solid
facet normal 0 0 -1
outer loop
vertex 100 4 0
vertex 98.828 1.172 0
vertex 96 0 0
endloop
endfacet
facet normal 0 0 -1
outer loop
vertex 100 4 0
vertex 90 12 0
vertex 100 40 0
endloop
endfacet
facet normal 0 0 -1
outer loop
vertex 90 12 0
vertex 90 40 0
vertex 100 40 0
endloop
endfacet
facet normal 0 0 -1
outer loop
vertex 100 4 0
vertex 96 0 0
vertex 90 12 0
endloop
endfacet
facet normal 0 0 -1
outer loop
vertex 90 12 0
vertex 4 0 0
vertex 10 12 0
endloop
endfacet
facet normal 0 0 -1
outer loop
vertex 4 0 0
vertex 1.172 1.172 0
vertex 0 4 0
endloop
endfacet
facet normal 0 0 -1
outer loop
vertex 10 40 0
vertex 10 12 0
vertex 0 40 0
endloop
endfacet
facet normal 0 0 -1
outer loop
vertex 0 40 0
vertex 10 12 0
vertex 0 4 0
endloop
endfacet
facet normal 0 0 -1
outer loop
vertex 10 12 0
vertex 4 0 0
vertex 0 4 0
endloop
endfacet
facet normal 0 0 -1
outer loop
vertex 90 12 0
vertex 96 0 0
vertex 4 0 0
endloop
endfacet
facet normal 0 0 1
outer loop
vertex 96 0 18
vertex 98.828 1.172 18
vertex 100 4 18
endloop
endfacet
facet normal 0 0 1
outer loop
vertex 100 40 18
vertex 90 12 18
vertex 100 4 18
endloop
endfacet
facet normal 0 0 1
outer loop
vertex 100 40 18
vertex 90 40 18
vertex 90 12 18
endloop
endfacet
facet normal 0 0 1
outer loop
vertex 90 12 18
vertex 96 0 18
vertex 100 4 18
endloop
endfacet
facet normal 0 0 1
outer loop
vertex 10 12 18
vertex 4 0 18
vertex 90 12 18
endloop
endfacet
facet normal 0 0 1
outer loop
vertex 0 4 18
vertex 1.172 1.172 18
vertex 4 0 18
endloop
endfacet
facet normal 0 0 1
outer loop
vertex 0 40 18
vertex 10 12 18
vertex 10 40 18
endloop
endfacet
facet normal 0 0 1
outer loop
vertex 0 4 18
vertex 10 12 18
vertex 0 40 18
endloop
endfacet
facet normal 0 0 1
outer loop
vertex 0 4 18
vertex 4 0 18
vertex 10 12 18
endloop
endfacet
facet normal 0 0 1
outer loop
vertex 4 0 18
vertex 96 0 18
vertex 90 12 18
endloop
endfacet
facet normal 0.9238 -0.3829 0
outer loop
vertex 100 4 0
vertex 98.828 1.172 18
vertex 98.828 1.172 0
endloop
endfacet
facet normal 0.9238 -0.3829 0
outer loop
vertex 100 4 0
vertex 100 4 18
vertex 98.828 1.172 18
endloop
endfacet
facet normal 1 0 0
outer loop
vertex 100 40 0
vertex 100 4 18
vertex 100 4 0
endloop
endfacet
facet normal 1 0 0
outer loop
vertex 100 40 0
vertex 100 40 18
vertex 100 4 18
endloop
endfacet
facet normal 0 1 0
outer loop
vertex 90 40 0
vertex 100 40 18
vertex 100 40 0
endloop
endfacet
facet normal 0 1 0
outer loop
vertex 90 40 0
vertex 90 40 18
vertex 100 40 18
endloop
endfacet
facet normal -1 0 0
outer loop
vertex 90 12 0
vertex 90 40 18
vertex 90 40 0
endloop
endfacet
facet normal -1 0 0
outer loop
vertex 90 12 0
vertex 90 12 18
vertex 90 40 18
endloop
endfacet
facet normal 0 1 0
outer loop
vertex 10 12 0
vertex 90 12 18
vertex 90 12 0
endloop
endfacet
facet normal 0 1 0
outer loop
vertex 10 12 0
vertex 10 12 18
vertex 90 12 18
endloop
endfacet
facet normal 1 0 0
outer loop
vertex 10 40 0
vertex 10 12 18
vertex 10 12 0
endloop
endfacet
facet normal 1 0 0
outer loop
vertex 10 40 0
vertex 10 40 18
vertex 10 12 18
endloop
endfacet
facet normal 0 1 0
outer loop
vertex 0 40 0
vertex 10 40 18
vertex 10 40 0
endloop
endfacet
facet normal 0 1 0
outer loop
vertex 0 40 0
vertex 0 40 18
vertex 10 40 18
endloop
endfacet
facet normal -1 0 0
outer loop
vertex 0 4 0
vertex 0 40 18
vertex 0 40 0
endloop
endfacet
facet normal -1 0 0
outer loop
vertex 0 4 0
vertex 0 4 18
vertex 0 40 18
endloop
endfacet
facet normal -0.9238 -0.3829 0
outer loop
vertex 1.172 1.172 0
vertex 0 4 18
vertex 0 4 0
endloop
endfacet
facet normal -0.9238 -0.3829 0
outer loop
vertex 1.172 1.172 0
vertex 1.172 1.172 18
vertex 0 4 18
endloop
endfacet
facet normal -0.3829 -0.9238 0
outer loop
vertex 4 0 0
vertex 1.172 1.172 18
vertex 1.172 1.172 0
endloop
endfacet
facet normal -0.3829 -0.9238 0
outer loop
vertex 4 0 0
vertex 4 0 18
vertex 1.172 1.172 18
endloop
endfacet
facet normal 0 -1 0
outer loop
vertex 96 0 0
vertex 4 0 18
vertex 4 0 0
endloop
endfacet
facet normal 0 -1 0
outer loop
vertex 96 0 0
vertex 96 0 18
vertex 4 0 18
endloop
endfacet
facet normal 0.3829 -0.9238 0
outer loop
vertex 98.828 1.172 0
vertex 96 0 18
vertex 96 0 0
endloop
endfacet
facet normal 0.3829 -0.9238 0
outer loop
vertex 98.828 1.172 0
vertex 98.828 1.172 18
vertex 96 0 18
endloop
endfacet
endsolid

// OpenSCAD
$fn = 32;

// ----------------------------------------------------------------------
// Heat sink frame: 100 x 40 mm frame, 10 mm walls
// ----------------------------------------------------------------------

// --- parameters (mm) ---
profile_height = 18;      // extrusion height
profile_points = 12;      // points of the closed outline

profile = [[0, 4], [1.172, 1.172], [4, 0], [96, 0], [98.828, 1.172], [100, 4], [100, 40], [90, 40], [90, 12], [10, 12], [10, 40], [0, 40]];  // single closed polygon, 12 points, counter clockwise

// --- the one profile operation ---
linear_extrude(height = profile_height) polygon(points = profile);
